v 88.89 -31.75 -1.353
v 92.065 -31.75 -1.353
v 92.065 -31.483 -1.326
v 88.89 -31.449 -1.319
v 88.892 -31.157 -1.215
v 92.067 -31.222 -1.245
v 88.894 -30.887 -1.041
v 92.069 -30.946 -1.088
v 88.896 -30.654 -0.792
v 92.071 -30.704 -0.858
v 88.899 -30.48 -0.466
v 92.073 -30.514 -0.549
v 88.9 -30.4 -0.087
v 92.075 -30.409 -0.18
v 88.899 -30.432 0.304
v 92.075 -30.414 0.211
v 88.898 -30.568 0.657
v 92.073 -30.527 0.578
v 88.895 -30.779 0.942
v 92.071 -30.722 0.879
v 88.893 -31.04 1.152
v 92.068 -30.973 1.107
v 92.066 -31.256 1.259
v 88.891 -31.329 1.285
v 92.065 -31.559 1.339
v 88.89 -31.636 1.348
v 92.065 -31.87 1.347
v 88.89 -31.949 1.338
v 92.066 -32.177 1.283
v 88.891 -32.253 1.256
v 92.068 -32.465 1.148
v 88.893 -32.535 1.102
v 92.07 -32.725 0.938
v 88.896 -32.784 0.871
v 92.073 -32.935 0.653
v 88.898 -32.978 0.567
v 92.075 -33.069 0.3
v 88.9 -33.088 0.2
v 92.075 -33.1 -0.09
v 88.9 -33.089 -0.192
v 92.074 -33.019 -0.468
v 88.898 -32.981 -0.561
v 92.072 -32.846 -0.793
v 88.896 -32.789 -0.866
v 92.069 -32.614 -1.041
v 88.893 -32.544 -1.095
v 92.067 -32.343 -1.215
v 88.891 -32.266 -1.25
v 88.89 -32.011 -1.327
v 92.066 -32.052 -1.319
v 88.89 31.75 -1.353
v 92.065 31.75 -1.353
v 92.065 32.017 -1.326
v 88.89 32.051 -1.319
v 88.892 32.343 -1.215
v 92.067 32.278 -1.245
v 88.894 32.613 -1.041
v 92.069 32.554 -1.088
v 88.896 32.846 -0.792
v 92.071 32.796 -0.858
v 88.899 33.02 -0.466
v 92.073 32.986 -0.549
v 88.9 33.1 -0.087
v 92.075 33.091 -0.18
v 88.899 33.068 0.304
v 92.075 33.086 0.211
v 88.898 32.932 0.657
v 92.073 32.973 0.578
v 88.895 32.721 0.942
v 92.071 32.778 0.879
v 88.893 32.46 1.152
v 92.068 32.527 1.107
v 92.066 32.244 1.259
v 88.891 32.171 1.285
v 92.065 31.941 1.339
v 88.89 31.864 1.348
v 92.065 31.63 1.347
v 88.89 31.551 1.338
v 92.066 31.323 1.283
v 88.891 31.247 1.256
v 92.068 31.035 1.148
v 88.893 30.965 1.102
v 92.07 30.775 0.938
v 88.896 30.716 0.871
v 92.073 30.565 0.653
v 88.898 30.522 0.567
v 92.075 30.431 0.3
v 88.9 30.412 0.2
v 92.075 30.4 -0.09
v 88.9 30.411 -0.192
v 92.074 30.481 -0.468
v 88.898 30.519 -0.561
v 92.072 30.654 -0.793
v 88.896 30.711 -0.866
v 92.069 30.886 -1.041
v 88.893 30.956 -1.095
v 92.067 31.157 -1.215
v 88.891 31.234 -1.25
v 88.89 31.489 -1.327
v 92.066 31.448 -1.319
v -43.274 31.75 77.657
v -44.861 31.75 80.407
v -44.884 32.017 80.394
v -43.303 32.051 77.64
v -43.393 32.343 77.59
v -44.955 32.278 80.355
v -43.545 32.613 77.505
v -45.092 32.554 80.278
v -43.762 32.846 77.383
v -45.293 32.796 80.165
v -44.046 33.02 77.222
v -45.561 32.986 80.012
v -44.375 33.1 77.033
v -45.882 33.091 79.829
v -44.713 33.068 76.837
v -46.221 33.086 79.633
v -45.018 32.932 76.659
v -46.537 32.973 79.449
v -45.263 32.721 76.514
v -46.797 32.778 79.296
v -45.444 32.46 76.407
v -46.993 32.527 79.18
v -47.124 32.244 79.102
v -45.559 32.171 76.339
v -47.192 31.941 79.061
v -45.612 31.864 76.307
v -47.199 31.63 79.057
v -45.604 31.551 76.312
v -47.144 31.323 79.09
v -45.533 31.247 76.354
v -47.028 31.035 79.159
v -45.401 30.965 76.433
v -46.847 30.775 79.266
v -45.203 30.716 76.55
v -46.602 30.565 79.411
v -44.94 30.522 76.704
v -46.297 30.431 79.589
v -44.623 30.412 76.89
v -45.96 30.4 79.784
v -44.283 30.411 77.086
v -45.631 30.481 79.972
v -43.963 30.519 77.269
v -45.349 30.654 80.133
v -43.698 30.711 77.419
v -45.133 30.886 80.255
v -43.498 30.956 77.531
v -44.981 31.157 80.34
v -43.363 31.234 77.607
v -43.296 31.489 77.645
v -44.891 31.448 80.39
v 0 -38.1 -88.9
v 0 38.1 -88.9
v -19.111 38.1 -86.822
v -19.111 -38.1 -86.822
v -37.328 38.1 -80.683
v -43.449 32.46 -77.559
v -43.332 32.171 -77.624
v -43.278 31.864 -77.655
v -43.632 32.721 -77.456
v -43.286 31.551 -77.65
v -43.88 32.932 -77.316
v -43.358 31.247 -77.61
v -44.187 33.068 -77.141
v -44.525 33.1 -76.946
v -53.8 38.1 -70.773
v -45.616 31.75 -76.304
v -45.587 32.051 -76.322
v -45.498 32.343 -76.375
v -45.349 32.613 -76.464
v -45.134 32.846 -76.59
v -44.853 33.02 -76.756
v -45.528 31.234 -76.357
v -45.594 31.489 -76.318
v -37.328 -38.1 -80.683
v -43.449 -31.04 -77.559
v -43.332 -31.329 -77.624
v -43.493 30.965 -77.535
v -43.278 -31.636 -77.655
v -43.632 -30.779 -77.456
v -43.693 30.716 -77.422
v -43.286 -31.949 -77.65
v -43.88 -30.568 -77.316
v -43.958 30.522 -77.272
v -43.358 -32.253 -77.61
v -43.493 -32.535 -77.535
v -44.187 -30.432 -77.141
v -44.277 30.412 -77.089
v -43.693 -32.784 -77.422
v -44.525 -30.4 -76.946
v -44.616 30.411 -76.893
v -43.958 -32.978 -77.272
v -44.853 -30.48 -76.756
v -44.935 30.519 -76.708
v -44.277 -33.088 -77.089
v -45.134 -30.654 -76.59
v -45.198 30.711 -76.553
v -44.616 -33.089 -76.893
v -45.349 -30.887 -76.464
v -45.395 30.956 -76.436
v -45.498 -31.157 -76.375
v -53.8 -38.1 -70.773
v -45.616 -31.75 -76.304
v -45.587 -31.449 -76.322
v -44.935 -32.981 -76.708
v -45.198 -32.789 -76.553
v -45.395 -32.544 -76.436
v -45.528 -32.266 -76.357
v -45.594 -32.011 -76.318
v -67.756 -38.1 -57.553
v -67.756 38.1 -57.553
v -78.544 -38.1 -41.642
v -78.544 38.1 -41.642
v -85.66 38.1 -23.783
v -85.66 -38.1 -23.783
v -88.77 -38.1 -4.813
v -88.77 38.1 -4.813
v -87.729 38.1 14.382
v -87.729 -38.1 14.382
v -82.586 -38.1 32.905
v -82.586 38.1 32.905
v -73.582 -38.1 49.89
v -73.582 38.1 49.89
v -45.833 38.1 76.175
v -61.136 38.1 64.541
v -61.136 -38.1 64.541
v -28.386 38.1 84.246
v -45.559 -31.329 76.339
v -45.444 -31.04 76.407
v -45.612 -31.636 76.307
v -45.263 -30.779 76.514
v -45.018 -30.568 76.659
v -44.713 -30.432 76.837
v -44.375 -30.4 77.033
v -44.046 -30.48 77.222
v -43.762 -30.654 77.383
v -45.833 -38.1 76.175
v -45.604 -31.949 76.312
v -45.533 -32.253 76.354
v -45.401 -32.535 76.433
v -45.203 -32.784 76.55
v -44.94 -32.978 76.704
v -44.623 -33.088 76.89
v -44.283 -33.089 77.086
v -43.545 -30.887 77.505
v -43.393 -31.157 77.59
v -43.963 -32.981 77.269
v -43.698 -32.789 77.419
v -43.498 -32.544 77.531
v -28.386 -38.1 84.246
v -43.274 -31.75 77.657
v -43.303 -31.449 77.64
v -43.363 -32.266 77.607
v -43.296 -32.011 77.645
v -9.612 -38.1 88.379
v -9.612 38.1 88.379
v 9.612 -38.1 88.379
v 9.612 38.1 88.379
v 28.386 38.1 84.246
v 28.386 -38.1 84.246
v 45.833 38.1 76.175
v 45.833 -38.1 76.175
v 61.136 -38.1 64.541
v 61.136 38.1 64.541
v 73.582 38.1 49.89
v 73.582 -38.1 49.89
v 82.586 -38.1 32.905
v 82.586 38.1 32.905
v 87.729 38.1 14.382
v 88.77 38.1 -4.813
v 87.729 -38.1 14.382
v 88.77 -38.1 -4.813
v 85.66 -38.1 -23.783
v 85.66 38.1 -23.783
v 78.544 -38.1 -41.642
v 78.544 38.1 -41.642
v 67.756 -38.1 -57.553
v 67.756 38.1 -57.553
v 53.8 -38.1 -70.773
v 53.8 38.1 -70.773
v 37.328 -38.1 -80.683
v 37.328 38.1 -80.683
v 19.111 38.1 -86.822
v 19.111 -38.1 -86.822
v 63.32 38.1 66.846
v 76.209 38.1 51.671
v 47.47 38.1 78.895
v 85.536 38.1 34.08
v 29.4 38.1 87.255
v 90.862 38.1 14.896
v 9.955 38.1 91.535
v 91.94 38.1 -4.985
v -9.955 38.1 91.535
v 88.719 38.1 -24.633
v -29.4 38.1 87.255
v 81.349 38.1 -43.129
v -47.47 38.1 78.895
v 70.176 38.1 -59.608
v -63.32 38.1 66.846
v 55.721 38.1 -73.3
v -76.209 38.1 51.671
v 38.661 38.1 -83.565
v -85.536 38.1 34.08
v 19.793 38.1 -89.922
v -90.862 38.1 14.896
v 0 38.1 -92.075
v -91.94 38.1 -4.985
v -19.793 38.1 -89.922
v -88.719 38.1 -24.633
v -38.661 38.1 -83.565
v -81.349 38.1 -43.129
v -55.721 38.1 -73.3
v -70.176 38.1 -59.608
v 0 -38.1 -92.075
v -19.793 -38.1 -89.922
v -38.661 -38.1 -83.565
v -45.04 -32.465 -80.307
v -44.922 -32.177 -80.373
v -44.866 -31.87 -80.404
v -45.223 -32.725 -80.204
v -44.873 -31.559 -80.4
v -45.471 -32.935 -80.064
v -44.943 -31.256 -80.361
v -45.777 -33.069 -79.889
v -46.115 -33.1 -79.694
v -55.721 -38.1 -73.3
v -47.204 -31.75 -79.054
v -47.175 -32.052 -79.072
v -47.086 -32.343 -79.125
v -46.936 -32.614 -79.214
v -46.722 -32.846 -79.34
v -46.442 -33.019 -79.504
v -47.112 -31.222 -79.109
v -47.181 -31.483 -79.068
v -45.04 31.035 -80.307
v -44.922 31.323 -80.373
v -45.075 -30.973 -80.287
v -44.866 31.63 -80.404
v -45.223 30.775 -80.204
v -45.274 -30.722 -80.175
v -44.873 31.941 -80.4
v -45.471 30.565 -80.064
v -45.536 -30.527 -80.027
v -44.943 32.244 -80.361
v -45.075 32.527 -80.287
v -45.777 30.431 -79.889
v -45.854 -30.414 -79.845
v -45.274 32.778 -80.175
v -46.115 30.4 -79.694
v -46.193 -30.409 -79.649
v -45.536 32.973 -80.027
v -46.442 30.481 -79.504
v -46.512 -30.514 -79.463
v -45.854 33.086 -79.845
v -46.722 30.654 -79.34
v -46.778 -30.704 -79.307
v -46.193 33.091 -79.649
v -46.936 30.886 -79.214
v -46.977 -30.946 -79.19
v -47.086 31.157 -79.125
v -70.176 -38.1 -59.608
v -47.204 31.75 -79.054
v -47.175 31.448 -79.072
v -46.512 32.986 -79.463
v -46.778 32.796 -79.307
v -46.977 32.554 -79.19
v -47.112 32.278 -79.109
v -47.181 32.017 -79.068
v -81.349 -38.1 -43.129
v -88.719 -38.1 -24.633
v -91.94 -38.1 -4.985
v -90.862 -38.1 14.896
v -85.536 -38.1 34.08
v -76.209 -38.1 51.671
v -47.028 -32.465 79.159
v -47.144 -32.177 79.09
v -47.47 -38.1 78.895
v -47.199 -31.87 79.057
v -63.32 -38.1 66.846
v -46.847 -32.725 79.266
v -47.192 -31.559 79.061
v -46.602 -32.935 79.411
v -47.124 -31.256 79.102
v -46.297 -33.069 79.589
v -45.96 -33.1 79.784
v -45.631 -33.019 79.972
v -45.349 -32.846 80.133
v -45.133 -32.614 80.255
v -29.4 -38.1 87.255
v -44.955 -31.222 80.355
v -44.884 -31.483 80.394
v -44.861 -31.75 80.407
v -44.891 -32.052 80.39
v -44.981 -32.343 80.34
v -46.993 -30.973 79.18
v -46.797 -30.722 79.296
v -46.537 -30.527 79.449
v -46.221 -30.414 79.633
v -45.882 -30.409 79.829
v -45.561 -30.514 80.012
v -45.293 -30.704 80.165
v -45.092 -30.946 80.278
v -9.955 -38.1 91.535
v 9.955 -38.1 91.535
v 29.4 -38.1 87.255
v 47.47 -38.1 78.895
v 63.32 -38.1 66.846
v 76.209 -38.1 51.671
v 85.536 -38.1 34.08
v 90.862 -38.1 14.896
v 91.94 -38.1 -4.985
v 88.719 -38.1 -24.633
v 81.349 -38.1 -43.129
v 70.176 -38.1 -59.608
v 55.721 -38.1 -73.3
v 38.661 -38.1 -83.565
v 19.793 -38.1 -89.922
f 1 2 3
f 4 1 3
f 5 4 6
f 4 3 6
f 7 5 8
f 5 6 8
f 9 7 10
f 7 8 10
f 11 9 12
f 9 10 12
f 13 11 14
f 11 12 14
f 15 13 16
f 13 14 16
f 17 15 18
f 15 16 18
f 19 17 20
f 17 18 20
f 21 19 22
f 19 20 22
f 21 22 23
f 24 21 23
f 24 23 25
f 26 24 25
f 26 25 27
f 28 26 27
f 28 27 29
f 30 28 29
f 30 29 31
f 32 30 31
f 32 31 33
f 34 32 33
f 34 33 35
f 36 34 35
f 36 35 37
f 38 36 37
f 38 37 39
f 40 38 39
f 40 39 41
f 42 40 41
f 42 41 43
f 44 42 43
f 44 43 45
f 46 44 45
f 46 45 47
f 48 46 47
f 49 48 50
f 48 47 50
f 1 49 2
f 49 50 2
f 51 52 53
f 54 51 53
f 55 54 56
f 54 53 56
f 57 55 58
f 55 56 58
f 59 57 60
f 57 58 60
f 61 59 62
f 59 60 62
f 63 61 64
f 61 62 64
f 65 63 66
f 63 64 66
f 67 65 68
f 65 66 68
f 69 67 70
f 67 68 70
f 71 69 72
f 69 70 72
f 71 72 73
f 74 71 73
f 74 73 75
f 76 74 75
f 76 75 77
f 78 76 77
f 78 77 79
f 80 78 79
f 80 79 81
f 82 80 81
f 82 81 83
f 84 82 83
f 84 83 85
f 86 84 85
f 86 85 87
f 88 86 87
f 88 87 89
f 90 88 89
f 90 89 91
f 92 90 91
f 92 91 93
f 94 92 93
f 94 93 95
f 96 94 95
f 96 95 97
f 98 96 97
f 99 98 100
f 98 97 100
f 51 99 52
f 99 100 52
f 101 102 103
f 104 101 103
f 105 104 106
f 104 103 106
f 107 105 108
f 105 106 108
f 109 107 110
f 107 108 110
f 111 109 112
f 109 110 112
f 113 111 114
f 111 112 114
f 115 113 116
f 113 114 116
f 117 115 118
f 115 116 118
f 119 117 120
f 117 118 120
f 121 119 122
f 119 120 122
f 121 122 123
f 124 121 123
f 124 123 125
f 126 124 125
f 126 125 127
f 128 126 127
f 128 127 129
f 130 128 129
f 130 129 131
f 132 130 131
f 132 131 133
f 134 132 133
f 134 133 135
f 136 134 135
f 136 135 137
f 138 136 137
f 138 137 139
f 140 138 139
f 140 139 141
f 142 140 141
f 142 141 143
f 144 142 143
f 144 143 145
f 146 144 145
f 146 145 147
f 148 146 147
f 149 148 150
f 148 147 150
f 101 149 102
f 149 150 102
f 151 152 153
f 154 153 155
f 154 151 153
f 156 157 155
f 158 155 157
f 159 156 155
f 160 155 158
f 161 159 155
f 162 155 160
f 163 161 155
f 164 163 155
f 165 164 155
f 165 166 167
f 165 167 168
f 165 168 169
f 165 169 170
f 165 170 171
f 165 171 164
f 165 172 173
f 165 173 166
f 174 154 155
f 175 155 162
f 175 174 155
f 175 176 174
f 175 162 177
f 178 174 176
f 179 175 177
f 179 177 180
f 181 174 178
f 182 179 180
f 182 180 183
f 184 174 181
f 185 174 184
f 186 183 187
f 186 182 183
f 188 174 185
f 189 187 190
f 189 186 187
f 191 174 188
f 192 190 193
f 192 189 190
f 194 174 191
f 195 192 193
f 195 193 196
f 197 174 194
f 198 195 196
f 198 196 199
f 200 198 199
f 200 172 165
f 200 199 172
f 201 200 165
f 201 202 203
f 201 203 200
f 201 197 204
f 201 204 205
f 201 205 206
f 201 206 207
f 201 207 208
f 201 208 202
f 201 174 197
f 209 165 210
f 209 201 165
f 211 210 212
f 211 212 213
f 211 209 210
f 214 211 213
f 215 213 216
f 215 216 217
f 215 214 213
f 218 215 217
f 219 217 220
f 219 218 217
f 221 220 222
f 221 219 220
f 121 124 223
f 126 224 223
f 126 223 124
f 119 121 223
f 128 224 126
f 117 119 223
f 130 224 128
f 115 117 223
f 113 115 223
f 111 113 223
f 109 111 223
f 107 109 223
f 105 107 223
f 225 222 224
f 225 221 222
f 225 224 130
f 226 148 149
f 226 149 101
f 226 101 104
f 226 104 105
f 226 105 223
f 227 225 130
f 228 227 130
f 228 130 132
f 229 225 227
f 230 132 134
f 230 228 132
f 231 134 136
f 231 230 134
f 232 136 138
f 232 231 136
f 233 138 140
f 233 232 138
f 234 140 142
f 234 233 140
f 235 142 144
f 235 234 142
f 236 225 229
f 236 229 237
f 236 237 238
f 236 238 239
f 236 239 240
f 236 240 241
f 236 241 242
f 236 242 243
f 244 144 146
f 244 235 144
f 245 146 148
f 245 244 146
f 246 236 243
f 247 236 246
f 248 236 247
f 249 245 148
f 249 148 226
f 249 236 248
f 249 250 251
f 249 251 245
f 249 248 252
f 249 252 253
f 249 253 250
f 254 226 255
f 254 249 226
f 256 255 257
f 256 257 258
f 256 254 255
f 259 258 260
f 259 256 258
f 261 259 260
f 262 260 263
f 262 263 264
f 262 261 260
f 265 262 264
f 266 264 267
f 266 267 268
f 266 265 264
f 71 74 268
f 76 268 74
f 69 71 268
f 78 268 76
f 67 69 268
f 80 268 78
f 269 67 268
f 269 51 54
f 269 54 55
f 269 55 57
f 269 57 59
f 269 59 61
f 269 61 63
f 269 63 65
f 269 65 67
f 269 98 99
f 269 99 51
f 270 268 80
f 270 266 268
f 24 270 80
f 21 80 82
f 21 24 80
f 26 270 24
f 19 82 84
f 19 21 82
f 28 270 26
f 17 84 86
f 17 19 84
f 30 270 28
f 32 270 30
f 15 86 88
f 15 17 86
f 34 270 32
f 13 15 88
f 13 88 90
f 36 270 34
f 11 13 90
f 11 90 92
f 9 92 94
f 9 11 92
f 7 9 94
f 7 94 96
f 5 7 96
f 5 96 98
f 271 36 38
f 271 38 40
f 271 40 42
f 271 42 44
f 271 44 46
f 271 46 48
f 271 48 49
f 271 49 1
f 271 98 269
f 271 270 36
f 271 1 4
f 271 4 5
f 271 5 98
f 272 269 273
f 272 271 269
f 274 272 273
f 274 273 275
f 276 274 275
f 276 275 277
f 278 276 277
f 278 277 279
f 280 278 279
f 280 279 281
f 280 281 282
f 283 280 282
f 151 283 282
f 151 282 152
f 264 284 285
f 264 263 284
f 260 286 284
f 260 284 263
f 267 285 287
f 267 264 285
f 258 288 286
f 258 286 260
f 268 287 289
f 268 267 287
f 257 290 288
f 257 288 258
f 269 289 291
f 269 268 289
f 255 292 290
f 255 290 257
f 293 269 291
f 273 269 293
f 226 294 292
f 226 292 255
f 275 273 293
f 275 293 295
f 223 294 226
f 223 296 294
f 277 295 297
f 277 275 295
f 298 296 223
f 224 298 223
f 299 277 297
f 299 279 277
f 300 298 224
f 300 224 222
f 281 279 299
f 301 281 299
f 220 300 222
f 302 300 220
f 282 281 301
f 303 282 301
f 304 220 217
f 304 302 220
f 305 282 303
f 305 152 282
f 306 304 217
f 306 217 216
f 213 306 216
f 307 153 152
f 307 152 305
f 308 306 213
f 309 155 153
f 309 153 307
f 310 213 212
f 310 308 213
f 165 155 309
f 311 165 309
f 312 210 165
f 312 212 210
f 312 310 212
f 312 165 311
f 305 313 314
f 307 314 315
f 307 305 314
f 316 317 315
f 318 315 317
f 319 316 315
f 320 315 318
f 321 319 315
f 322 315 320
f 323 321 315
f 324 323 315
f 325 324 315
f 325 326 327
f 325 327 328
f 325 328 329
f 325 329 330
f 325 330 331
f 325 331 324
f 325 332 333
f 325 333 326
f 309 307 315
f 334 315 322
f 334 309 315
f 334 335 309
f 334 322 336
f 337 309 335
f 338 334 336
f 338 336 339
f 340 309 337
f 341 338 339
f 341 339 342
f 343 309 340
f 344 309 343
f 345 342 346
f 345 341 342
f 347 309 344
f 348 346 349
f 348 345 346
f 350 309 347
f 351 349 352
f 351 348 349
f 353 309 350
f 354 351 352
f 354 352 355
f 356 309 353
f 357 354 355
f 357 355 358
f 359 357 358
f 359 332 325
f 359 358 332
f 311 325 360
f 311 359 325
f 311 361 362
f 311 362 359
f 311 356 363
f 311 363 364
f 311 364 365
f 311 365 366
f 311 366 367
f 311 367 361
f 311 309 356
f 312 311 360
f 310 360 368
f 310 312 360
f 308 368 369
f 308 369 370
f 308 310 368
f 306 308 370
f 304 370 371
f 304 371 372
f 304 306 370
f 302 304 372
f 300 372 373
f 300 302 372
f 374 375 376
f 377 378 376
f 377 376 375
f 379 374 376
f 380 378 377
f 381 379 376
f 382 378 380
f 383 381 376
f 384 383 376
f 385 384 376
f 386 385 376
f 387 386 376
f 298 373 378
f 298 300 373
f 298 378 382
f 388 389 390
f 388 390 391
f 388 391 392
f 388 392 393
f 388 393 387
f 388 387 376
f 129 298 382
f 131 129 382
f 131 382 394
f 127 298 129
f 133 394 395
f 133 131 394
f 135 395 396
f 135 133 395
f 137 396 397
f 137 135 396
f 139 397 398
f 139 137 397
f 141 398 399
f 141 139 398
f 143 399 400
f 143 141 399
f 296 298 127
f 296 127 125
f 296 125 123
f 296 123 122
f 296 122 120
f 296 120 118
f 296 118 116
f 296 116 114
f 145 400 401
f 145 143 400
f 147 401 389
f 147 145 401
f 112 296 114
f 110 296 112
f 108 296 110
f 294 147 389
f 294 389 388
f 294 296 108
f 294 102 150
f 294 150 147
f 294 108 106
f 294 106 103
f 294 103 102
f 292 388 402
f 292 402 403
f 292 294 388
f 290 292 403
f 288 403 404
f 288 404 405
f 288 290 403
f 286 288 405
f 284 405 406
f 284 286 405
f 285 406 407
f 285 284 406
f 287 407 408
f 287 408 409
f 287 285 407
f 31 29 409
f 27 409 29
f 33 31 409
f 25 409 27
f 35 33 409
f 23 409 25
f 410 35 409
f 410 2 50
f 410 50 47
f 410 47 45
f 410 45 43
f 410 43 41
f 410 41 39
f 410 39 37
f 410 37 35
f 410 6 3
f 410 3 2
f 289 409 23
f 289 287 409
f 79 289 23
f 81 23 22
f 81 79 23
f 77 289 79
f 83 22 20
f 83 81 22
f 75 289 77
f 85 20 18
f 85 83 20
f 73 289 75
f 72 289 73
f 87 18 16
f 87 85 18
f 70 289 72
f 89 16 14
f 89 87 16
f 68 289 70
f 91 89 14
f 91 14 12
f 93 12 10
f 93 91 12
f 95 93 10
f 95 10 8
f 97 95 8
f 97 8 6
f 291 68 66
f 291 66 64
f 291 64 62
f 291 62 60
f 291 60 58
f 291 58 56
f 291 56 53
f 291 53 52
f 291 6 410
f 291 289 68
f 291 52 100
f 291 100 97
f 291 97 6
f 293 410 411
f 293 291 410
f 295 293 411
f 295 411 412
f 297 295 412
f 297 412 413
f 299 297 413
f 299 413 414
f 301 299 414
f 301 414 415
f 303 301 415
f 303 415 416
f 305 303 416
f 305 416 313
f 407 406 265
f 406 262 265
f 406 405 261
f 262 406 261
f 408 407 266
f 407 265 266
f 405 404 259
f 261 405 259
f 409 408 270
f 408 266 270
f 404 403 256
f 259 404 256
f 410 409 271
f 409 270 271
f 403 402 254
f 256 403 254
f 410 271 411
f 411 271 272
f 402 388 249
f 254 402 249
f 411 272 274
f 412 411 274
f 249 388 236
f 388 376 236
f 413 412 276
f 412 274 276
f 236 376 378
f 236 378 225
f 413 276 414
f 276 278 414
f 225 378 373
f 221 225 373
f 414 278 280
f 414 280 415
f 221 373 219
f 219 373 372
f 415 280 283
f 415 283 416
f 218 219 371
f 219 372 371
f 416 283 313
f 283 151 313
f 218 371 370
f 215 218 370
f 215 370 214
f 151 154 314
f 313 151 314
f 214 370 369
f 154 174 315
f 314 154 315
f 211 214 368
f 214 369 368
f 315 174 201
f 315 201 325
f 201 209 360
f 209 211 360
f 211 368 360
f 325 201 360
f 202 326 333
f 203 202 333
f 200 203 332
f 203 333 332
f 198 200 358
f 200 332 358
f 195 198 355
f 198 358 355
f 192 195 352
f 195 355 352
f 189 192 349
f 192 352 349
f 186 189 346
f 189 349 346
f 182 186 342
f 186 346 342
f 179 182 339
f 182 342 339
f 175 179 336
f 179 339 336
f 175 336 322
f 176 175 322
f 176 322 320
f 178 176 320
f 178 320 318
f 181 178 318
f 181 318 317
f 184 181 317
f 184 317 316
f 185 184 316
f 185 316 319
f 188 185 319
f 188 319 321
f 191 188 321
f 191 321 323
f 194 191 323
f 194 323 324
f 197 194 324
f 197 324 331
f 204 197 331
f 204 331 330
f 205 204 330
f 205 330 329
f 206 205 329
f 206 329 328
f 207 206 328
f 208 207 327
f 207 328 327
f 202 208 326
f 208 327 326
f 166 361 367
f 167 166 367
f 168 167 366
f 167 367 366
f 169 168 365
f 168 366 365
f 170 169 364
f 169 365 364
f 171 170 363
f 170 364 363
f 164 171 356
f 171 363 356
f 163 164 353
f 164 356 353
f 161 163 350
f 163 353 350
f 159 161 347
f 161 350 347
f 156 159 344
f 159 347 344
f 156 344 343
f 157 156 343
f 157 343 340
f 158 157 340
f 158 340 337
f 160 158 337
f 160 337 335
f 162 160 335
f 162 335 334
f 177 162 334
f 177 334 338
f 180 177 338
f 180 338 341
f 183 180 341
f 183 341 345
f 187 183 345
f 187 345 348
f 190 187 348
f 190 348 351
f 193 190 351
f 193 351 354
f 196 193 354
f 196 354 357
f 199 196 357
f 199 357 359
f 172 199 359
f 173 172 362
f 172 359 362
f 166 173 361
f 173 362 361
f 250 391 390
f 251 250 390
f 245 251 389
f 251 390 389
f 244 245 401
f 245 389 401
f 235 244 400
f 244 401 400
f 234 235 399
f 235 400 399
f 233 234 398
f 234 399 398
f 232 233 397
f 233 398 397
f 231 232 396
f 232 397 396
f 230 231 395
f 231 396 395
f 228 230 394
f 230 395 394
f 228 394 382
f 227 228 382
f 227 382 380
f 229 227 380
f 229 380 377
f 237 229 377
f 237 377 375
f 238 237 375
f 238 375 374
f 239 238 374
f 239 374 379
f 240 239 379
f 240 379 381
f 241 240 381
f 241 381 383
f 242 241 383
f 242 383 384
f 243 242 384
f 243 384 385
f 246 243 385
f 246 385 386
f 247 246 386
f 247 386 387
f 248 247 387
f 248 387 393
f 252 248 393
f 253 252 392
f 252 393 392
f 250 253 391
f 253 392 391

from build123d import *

# Parameters (mm, degrees)
SKETCH1_R           = 92.075
SKETCH1_R_2         = 88.9
BOSS_EXTRUDE1_DEPTH = 38.1
SKETCH3_R           = 1.35255
CUT_EXTRUDE1_DEPTH  = 34.798
CIRPATTERN1_COUNT   = 3


with BuildPart() as part:
    # Sketch1 → Boss-Extrude1 (new, symmetric)
    with BuildSketch(Plane(origin=(0, 0, 0), x_dir=(1, 0, 0), z_dir=(0, 1, 0))):
        with Locations(Location((0, 0, 0), (0, 0, 90))):
            Circle(SKETCH1_R)
        with Locations(Location((0, 0, 0), (0, 0, 90))):
            Circle(SKETCH1_R_2, mode=Mode.SUBTRACT)
    extrude(amount=BOSS_EXTRUDE1_DEPTH, both=True)

    # Sketch3 → Cut-Extrude1 (cut)
    with BuildSketch(Plane(origin=(92.075, 0, 0), x_dir=(0, 0, -1), z_dir=(1, 0, 0))):
        with Locations((0, -31.75)):
            Circle(SKETCH3_R)
        with Locations((0, 31.75)):
            Circle(SKETCH3_R)
    cut_extrude1 = extrude(amount=-CUT_EXTRUDE1_DEPTH, mode=Mode.SUBTRACT)

    # CirPattern1: Cut-Extrude1 ×3 about axis
    cirpattern1_axis = Axis((0, 38.1, 0), (0, -1, 0))
    for i in range(1, CIRPATTERN1_COUNT):
        add(cut_extrude1.rotate(cirpattern1_axis, i * 360 / CIRPATTERN1_COUNT), mode=Mode.SUBTRACT)


solid = part.part
